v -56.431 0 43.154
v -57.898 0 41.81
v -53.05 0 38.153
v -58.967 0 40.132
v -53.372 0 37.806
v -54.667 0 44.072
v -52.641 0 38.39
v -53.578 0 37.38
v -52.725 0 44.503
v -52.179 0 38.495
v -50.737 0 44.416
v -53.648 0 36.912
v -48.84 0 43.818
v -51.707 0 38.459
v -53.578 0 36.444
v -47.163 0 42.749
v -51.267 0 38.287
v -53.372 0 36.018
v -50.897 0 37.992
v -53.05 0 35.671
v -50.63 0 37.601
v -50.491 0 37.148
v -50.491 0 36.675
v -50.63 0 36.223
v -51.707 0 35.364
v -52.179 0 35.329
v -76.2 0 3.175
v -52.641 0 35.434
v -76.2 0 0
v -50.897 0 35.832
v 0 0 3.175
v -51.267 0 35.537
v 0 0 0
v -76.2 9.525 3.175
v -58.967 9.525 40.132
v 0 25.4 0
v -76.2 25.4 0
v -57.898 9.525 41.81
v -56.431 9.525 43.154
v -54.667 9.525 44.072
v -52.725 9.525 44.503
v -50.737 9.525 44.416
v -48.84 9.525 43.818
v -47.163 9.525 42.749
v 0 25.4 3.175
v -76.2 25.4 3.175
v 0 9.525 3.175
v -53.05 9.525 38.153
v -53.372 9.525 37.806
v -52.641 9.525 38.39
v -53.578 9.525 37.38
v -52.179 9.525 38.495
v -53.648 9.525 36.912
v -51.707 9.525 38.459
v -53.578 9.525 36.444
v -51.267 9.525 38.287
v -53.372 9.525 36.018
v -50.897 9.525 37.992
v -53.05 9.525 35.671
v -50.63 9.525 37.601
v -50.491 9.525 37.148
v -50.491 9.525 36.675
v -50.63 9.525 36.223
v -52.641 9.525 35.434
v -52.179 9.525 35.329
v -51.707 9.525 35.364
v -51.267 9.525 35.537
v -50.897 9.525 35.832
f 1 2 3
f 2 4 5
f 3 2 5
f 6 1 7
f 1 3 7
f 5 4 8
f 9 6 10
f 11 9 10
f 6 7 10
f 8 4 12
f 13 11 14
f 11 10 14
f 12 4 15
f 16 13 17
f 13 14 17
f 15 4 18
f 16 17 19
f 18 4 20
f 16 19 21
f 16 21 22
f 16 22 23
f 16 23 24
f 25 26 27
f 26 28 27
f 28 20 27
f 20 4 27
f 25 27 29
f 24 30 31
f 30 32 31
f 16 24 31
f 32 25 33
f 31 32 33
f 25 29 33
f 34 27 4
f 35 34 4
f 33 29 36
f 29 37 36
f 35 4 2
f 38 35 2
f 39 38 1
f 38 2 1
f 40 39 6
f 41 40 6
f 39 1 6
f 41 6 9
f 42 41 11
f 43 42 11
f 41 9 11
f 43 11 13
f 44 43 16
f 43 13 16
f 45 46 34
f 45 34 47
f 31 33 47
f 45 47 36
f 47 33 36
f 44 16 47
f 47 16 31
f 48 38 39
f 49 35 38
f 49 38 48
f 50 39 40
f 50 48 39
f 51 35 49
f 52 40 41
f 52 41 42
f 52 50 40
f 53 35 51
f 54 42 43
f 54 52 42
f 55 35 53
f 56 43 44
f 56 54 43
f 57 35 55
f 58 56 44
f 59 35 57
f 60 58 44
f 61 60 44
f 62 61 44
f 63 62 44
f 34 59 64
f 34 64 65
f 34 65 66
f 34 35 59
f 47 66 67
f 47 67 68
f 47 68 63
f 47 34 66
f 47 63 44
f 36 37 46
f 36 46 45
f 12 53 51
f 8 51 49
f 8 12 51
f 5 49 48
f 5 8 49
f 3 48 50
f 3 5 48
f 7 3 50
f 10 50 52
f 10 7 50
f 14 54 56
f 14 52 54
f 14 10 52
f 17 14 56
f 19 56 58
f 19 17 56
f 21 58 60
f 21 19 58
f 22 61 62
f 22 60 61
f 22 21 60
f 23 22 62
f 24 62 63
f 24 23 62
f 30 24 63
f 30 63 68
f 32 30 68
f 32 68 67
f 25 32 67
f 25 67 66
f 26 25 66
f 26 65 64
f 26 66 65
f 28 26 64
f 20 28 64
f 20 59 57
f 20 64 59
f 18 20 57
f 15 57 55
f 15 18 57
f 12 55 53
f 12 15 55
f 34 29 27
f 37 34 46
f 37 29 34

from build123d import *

# Parameters (mm, degrees)
SKETCH1_W               = 76.2
SKETCH1_H               = 25.4
BOSS_EXTRUDE1_DEPTH     = 3.175
BOSS_EXTRUDE2_DEPTH     = 9.525
CUT_EXTRUDE1_DEPTH      = 90.67460564
CUT_EXTRUDE1_DEPTH_BACK = 9.525
SKETCH3_R               = 1.5875


with BuildPart() as part:
    # Sketch1 → Boss-Extrude1 (new body)
    with BuildSketch(Plane.XY):
        with Locations((-38.1, 12.7)):
            Rectangle(SKETCH1_W, SKETCH1_H)
    extrude(amount=BOSS_EXTRUDE1_DEPTH)

    # Sketch2 → Boss-Extrude2 (add)
    with BuildSketch(Plane(origin=(0, 0, 0), x_dir=(-1, 0, 0), z_dir=(0, -1, 0))):
        with BuildLine():
            Line((0, 0), (76.2, 0))
            Line((76.2, 0), (76.2, -3.175))
            Line((76.2, -3.175), (58.966607548, -40.132129378))
            ThreePointArc((58.966607548, -40.132129378), (53.709812069, -44.351153797), (47.162500625, -42.74903688))
            Line((47.162500625, -42.74903688), (0, -3.175))
            Line((0, -3.175), (0, 0))
        make_face()
    extrude(amount=-BOSS_EXTRUDE2_DEPTH)

    # Sketch3 → Cut-Extrude1 (cut, two sides: drawn at the far end of the back side and taken through both)
    with BuildSketch(Plane(origin=(0, 9.525, 0), x_dir=(1, 0, 0), z_dir=(0, 1, 0)).offset(-CUT_EXTRUDE1_DEPTH_BACK)):
        with Locations(Location((-52.060542211, -36.911778223, 0), (0, 0, 180))):
            Circle(SKETCH3_R)
    extrude(amount=CUT_EXTRUDE1_DEPTH + CUT_EXTRUDE1_DEPTH_BACK, mode=Mode.SUBTRACT)


solid = part.part
